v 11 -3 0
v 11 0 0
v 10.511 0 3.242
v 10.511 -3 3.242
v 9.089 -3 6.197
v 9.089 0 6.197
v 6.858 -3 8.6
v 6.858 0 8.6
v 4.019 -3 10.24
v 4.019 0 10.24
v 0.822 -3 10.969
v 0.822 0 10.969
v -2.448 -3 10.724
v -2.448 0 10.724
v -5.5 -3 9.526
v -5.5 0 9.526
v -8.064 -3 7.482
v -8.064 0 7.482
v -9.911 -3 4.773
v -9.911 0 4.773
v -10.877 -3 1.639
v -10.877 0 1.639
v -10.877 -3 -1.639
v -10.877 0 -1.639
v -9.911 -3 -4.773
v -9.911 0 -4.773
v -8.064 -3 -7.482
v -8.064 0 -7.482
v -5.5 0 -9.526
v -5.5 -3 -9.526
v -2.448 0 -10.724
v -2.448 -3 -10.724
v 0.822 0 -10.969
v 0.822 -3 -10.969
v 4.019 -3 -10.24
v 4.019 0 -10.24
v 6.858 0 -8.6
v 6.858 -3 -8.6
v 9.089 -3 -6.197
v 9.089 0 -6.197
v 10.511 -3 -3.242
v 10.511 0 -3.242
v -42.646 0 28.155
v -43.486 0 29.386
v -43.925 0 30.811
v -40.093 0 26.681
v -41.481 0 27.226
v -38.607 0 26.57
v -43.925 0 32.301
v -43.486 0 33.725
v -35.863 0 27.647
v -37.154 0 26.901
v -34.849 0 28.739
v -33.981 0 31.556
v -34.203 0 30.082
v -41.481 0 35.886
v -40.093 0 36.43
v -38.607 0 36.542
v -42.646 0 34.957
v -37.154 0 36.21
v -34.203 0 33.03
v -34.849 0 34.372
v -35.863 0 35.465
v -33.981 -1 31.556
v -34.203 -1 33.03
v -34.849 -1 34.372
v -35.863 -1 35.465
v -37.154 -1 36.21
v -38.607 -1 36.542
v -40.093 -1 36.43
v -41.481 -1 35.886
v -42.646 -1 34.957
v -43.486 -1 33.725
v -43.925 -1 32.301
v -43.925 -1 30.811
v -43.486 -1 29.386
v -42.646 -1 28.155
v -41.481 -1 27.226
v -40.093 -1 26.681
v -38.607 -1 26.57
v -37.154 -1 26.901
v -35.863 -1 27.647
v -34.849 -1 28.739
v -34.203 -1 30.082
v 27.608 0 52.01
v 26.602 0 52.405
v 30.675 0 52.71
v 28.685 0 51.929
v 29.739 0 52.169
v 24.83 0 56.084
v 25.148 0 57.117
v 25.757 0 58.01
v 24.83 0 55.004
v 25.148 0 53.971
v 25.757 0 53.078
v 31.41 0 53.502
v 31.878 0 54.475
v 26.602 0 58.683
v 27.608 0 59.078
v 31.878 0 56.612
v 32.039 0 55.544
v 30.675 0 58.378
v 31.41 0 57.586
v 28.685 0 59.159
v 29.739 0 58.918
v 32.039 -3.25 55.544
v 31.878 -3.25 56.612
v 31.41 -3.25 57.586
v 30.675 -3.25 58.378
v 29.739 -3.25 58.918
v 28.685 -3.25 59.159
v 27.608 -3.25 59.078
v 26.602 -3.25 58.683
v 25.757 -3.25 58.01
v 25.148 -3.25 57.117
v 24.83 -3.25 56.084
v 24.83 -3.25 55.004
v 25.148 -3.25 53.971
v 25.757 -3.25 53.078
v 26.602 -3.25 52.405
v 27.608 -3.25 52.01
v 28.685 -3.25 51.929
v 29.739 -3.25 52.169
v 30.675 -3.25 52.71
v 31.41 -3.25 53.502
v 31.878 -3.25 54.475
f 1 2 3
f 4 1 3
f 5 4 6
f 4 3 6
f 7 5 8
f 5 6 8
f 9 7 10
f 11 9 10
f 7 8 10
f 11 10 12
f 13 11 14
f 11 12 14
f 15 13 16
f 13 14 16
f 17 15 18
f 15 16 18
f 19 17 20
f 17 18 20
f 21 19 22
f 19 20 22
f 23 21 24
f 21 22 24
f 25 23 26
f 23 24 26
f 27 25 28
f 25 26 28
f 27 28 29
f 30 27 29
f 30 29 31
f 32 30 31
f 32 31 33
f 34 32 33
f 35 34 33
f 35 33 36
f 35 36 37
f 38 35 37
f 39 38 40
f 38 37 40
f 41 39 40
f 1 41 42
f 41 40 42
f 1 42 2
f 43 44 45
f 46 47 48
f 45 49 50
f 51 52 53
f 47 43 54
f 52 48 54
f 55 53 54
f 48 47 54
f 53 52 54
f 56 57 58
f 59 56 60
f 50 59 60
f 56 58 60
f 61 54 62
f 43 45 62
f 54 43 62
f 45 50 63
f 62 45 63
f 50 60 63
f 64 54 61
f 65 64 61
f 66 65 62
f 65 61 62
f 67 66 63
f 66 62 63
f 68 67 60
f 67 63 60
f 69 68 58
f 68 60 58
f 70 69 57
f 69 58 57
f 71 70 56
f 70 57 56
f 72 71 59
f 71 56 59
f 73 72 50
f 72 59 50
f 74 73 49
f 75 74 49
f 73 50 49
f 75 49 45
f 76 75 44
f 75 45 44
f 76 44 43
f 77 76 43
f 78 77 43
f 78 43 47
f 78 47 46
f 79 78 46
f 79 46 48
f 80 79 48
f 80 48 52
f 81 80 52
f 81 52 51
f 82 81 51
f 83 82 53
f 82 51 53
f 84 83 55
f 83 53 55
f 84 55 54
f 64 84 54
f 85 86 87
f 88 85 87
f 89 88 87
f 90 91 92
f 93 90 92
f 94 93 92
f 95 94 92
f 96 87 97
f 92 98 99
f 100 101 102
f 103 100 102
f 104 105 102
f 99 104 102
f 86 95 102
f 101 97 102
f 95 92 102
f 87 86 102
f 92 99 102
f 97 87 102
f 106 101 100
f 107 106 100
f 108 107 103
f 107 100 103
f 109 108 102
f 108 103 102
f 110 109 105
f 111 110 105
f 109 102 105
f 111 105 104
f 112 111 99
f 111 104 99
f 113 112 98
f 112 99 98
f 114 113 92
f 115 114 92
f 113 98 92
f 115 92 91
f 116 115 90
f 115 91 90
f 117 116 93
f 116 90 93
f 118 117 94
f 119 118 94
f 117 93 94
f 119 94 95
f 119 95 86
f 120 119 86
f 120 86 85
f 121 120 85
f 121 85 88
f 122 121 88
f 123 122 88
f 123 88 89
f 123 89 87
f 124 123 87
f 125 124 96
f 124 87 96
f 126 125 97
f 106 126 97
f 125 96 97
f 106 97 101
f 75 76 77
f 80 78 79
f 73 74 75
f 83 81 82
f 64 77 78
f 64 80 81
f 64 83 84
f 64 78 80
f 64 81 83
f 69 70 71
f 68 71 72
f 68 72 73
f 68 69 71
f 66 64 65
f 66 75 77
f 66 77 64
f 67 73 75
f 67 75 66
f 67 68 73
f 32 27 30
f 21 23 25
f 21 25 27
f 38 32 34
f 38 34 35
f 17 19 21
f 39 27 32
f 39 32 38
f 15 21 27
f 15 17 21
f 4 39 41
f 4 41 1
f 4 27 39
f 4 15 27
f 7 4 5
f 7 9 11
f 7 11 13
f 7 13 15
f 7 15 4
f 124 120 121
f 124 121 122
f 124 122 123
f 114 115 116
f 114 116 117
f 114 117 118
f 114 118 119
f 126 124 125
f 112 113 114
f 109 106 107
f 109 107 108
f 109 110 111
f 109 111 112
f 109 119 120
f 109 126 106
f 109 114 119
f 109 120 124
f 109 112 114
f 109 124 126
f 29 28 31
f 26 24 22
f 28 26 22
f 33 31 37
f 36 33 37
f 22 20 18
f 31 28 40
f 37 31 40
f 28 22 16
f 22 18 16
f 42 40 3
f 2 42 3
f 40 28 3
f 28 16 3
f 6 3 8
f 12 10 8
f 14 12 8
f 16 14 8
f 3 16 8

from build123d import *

# Parameters (mm, degrees)
F0_R     = 11
F1_DEPTH = 3
F0_R_2   = 5
F2_DEPTH = 1
F0_R_3   = 3.625
F3_DEPTH = 3.25


with BuildPart() as f1:
    # F0 (on Front) → F1 (new body)
    with BuildSketch(Plane.XZ):
        Circle(F0_R)
    extrude(amount=F1_DEPTH)


with BuildPart() as f2:
    # F0 (on Front) → F2 (new body)
    with BuildSketch(Plane.XZ):
        with Locations((-38.980667, 31.555783)):
            Circle(F0_R_2)
    extrude(amount=F2_DEPTH)


with BuildPart() as f3:
    # F0 (on Front) → F3 (new body)
    with BuildSketch(Plane.XZ):
        with Locations((28.414482, 55.543885)):
            Circle(F0_R_3)
    extrude(amount=F3_DEPTH)


solid = Compound([f1.part, f2.part, f3.part])
